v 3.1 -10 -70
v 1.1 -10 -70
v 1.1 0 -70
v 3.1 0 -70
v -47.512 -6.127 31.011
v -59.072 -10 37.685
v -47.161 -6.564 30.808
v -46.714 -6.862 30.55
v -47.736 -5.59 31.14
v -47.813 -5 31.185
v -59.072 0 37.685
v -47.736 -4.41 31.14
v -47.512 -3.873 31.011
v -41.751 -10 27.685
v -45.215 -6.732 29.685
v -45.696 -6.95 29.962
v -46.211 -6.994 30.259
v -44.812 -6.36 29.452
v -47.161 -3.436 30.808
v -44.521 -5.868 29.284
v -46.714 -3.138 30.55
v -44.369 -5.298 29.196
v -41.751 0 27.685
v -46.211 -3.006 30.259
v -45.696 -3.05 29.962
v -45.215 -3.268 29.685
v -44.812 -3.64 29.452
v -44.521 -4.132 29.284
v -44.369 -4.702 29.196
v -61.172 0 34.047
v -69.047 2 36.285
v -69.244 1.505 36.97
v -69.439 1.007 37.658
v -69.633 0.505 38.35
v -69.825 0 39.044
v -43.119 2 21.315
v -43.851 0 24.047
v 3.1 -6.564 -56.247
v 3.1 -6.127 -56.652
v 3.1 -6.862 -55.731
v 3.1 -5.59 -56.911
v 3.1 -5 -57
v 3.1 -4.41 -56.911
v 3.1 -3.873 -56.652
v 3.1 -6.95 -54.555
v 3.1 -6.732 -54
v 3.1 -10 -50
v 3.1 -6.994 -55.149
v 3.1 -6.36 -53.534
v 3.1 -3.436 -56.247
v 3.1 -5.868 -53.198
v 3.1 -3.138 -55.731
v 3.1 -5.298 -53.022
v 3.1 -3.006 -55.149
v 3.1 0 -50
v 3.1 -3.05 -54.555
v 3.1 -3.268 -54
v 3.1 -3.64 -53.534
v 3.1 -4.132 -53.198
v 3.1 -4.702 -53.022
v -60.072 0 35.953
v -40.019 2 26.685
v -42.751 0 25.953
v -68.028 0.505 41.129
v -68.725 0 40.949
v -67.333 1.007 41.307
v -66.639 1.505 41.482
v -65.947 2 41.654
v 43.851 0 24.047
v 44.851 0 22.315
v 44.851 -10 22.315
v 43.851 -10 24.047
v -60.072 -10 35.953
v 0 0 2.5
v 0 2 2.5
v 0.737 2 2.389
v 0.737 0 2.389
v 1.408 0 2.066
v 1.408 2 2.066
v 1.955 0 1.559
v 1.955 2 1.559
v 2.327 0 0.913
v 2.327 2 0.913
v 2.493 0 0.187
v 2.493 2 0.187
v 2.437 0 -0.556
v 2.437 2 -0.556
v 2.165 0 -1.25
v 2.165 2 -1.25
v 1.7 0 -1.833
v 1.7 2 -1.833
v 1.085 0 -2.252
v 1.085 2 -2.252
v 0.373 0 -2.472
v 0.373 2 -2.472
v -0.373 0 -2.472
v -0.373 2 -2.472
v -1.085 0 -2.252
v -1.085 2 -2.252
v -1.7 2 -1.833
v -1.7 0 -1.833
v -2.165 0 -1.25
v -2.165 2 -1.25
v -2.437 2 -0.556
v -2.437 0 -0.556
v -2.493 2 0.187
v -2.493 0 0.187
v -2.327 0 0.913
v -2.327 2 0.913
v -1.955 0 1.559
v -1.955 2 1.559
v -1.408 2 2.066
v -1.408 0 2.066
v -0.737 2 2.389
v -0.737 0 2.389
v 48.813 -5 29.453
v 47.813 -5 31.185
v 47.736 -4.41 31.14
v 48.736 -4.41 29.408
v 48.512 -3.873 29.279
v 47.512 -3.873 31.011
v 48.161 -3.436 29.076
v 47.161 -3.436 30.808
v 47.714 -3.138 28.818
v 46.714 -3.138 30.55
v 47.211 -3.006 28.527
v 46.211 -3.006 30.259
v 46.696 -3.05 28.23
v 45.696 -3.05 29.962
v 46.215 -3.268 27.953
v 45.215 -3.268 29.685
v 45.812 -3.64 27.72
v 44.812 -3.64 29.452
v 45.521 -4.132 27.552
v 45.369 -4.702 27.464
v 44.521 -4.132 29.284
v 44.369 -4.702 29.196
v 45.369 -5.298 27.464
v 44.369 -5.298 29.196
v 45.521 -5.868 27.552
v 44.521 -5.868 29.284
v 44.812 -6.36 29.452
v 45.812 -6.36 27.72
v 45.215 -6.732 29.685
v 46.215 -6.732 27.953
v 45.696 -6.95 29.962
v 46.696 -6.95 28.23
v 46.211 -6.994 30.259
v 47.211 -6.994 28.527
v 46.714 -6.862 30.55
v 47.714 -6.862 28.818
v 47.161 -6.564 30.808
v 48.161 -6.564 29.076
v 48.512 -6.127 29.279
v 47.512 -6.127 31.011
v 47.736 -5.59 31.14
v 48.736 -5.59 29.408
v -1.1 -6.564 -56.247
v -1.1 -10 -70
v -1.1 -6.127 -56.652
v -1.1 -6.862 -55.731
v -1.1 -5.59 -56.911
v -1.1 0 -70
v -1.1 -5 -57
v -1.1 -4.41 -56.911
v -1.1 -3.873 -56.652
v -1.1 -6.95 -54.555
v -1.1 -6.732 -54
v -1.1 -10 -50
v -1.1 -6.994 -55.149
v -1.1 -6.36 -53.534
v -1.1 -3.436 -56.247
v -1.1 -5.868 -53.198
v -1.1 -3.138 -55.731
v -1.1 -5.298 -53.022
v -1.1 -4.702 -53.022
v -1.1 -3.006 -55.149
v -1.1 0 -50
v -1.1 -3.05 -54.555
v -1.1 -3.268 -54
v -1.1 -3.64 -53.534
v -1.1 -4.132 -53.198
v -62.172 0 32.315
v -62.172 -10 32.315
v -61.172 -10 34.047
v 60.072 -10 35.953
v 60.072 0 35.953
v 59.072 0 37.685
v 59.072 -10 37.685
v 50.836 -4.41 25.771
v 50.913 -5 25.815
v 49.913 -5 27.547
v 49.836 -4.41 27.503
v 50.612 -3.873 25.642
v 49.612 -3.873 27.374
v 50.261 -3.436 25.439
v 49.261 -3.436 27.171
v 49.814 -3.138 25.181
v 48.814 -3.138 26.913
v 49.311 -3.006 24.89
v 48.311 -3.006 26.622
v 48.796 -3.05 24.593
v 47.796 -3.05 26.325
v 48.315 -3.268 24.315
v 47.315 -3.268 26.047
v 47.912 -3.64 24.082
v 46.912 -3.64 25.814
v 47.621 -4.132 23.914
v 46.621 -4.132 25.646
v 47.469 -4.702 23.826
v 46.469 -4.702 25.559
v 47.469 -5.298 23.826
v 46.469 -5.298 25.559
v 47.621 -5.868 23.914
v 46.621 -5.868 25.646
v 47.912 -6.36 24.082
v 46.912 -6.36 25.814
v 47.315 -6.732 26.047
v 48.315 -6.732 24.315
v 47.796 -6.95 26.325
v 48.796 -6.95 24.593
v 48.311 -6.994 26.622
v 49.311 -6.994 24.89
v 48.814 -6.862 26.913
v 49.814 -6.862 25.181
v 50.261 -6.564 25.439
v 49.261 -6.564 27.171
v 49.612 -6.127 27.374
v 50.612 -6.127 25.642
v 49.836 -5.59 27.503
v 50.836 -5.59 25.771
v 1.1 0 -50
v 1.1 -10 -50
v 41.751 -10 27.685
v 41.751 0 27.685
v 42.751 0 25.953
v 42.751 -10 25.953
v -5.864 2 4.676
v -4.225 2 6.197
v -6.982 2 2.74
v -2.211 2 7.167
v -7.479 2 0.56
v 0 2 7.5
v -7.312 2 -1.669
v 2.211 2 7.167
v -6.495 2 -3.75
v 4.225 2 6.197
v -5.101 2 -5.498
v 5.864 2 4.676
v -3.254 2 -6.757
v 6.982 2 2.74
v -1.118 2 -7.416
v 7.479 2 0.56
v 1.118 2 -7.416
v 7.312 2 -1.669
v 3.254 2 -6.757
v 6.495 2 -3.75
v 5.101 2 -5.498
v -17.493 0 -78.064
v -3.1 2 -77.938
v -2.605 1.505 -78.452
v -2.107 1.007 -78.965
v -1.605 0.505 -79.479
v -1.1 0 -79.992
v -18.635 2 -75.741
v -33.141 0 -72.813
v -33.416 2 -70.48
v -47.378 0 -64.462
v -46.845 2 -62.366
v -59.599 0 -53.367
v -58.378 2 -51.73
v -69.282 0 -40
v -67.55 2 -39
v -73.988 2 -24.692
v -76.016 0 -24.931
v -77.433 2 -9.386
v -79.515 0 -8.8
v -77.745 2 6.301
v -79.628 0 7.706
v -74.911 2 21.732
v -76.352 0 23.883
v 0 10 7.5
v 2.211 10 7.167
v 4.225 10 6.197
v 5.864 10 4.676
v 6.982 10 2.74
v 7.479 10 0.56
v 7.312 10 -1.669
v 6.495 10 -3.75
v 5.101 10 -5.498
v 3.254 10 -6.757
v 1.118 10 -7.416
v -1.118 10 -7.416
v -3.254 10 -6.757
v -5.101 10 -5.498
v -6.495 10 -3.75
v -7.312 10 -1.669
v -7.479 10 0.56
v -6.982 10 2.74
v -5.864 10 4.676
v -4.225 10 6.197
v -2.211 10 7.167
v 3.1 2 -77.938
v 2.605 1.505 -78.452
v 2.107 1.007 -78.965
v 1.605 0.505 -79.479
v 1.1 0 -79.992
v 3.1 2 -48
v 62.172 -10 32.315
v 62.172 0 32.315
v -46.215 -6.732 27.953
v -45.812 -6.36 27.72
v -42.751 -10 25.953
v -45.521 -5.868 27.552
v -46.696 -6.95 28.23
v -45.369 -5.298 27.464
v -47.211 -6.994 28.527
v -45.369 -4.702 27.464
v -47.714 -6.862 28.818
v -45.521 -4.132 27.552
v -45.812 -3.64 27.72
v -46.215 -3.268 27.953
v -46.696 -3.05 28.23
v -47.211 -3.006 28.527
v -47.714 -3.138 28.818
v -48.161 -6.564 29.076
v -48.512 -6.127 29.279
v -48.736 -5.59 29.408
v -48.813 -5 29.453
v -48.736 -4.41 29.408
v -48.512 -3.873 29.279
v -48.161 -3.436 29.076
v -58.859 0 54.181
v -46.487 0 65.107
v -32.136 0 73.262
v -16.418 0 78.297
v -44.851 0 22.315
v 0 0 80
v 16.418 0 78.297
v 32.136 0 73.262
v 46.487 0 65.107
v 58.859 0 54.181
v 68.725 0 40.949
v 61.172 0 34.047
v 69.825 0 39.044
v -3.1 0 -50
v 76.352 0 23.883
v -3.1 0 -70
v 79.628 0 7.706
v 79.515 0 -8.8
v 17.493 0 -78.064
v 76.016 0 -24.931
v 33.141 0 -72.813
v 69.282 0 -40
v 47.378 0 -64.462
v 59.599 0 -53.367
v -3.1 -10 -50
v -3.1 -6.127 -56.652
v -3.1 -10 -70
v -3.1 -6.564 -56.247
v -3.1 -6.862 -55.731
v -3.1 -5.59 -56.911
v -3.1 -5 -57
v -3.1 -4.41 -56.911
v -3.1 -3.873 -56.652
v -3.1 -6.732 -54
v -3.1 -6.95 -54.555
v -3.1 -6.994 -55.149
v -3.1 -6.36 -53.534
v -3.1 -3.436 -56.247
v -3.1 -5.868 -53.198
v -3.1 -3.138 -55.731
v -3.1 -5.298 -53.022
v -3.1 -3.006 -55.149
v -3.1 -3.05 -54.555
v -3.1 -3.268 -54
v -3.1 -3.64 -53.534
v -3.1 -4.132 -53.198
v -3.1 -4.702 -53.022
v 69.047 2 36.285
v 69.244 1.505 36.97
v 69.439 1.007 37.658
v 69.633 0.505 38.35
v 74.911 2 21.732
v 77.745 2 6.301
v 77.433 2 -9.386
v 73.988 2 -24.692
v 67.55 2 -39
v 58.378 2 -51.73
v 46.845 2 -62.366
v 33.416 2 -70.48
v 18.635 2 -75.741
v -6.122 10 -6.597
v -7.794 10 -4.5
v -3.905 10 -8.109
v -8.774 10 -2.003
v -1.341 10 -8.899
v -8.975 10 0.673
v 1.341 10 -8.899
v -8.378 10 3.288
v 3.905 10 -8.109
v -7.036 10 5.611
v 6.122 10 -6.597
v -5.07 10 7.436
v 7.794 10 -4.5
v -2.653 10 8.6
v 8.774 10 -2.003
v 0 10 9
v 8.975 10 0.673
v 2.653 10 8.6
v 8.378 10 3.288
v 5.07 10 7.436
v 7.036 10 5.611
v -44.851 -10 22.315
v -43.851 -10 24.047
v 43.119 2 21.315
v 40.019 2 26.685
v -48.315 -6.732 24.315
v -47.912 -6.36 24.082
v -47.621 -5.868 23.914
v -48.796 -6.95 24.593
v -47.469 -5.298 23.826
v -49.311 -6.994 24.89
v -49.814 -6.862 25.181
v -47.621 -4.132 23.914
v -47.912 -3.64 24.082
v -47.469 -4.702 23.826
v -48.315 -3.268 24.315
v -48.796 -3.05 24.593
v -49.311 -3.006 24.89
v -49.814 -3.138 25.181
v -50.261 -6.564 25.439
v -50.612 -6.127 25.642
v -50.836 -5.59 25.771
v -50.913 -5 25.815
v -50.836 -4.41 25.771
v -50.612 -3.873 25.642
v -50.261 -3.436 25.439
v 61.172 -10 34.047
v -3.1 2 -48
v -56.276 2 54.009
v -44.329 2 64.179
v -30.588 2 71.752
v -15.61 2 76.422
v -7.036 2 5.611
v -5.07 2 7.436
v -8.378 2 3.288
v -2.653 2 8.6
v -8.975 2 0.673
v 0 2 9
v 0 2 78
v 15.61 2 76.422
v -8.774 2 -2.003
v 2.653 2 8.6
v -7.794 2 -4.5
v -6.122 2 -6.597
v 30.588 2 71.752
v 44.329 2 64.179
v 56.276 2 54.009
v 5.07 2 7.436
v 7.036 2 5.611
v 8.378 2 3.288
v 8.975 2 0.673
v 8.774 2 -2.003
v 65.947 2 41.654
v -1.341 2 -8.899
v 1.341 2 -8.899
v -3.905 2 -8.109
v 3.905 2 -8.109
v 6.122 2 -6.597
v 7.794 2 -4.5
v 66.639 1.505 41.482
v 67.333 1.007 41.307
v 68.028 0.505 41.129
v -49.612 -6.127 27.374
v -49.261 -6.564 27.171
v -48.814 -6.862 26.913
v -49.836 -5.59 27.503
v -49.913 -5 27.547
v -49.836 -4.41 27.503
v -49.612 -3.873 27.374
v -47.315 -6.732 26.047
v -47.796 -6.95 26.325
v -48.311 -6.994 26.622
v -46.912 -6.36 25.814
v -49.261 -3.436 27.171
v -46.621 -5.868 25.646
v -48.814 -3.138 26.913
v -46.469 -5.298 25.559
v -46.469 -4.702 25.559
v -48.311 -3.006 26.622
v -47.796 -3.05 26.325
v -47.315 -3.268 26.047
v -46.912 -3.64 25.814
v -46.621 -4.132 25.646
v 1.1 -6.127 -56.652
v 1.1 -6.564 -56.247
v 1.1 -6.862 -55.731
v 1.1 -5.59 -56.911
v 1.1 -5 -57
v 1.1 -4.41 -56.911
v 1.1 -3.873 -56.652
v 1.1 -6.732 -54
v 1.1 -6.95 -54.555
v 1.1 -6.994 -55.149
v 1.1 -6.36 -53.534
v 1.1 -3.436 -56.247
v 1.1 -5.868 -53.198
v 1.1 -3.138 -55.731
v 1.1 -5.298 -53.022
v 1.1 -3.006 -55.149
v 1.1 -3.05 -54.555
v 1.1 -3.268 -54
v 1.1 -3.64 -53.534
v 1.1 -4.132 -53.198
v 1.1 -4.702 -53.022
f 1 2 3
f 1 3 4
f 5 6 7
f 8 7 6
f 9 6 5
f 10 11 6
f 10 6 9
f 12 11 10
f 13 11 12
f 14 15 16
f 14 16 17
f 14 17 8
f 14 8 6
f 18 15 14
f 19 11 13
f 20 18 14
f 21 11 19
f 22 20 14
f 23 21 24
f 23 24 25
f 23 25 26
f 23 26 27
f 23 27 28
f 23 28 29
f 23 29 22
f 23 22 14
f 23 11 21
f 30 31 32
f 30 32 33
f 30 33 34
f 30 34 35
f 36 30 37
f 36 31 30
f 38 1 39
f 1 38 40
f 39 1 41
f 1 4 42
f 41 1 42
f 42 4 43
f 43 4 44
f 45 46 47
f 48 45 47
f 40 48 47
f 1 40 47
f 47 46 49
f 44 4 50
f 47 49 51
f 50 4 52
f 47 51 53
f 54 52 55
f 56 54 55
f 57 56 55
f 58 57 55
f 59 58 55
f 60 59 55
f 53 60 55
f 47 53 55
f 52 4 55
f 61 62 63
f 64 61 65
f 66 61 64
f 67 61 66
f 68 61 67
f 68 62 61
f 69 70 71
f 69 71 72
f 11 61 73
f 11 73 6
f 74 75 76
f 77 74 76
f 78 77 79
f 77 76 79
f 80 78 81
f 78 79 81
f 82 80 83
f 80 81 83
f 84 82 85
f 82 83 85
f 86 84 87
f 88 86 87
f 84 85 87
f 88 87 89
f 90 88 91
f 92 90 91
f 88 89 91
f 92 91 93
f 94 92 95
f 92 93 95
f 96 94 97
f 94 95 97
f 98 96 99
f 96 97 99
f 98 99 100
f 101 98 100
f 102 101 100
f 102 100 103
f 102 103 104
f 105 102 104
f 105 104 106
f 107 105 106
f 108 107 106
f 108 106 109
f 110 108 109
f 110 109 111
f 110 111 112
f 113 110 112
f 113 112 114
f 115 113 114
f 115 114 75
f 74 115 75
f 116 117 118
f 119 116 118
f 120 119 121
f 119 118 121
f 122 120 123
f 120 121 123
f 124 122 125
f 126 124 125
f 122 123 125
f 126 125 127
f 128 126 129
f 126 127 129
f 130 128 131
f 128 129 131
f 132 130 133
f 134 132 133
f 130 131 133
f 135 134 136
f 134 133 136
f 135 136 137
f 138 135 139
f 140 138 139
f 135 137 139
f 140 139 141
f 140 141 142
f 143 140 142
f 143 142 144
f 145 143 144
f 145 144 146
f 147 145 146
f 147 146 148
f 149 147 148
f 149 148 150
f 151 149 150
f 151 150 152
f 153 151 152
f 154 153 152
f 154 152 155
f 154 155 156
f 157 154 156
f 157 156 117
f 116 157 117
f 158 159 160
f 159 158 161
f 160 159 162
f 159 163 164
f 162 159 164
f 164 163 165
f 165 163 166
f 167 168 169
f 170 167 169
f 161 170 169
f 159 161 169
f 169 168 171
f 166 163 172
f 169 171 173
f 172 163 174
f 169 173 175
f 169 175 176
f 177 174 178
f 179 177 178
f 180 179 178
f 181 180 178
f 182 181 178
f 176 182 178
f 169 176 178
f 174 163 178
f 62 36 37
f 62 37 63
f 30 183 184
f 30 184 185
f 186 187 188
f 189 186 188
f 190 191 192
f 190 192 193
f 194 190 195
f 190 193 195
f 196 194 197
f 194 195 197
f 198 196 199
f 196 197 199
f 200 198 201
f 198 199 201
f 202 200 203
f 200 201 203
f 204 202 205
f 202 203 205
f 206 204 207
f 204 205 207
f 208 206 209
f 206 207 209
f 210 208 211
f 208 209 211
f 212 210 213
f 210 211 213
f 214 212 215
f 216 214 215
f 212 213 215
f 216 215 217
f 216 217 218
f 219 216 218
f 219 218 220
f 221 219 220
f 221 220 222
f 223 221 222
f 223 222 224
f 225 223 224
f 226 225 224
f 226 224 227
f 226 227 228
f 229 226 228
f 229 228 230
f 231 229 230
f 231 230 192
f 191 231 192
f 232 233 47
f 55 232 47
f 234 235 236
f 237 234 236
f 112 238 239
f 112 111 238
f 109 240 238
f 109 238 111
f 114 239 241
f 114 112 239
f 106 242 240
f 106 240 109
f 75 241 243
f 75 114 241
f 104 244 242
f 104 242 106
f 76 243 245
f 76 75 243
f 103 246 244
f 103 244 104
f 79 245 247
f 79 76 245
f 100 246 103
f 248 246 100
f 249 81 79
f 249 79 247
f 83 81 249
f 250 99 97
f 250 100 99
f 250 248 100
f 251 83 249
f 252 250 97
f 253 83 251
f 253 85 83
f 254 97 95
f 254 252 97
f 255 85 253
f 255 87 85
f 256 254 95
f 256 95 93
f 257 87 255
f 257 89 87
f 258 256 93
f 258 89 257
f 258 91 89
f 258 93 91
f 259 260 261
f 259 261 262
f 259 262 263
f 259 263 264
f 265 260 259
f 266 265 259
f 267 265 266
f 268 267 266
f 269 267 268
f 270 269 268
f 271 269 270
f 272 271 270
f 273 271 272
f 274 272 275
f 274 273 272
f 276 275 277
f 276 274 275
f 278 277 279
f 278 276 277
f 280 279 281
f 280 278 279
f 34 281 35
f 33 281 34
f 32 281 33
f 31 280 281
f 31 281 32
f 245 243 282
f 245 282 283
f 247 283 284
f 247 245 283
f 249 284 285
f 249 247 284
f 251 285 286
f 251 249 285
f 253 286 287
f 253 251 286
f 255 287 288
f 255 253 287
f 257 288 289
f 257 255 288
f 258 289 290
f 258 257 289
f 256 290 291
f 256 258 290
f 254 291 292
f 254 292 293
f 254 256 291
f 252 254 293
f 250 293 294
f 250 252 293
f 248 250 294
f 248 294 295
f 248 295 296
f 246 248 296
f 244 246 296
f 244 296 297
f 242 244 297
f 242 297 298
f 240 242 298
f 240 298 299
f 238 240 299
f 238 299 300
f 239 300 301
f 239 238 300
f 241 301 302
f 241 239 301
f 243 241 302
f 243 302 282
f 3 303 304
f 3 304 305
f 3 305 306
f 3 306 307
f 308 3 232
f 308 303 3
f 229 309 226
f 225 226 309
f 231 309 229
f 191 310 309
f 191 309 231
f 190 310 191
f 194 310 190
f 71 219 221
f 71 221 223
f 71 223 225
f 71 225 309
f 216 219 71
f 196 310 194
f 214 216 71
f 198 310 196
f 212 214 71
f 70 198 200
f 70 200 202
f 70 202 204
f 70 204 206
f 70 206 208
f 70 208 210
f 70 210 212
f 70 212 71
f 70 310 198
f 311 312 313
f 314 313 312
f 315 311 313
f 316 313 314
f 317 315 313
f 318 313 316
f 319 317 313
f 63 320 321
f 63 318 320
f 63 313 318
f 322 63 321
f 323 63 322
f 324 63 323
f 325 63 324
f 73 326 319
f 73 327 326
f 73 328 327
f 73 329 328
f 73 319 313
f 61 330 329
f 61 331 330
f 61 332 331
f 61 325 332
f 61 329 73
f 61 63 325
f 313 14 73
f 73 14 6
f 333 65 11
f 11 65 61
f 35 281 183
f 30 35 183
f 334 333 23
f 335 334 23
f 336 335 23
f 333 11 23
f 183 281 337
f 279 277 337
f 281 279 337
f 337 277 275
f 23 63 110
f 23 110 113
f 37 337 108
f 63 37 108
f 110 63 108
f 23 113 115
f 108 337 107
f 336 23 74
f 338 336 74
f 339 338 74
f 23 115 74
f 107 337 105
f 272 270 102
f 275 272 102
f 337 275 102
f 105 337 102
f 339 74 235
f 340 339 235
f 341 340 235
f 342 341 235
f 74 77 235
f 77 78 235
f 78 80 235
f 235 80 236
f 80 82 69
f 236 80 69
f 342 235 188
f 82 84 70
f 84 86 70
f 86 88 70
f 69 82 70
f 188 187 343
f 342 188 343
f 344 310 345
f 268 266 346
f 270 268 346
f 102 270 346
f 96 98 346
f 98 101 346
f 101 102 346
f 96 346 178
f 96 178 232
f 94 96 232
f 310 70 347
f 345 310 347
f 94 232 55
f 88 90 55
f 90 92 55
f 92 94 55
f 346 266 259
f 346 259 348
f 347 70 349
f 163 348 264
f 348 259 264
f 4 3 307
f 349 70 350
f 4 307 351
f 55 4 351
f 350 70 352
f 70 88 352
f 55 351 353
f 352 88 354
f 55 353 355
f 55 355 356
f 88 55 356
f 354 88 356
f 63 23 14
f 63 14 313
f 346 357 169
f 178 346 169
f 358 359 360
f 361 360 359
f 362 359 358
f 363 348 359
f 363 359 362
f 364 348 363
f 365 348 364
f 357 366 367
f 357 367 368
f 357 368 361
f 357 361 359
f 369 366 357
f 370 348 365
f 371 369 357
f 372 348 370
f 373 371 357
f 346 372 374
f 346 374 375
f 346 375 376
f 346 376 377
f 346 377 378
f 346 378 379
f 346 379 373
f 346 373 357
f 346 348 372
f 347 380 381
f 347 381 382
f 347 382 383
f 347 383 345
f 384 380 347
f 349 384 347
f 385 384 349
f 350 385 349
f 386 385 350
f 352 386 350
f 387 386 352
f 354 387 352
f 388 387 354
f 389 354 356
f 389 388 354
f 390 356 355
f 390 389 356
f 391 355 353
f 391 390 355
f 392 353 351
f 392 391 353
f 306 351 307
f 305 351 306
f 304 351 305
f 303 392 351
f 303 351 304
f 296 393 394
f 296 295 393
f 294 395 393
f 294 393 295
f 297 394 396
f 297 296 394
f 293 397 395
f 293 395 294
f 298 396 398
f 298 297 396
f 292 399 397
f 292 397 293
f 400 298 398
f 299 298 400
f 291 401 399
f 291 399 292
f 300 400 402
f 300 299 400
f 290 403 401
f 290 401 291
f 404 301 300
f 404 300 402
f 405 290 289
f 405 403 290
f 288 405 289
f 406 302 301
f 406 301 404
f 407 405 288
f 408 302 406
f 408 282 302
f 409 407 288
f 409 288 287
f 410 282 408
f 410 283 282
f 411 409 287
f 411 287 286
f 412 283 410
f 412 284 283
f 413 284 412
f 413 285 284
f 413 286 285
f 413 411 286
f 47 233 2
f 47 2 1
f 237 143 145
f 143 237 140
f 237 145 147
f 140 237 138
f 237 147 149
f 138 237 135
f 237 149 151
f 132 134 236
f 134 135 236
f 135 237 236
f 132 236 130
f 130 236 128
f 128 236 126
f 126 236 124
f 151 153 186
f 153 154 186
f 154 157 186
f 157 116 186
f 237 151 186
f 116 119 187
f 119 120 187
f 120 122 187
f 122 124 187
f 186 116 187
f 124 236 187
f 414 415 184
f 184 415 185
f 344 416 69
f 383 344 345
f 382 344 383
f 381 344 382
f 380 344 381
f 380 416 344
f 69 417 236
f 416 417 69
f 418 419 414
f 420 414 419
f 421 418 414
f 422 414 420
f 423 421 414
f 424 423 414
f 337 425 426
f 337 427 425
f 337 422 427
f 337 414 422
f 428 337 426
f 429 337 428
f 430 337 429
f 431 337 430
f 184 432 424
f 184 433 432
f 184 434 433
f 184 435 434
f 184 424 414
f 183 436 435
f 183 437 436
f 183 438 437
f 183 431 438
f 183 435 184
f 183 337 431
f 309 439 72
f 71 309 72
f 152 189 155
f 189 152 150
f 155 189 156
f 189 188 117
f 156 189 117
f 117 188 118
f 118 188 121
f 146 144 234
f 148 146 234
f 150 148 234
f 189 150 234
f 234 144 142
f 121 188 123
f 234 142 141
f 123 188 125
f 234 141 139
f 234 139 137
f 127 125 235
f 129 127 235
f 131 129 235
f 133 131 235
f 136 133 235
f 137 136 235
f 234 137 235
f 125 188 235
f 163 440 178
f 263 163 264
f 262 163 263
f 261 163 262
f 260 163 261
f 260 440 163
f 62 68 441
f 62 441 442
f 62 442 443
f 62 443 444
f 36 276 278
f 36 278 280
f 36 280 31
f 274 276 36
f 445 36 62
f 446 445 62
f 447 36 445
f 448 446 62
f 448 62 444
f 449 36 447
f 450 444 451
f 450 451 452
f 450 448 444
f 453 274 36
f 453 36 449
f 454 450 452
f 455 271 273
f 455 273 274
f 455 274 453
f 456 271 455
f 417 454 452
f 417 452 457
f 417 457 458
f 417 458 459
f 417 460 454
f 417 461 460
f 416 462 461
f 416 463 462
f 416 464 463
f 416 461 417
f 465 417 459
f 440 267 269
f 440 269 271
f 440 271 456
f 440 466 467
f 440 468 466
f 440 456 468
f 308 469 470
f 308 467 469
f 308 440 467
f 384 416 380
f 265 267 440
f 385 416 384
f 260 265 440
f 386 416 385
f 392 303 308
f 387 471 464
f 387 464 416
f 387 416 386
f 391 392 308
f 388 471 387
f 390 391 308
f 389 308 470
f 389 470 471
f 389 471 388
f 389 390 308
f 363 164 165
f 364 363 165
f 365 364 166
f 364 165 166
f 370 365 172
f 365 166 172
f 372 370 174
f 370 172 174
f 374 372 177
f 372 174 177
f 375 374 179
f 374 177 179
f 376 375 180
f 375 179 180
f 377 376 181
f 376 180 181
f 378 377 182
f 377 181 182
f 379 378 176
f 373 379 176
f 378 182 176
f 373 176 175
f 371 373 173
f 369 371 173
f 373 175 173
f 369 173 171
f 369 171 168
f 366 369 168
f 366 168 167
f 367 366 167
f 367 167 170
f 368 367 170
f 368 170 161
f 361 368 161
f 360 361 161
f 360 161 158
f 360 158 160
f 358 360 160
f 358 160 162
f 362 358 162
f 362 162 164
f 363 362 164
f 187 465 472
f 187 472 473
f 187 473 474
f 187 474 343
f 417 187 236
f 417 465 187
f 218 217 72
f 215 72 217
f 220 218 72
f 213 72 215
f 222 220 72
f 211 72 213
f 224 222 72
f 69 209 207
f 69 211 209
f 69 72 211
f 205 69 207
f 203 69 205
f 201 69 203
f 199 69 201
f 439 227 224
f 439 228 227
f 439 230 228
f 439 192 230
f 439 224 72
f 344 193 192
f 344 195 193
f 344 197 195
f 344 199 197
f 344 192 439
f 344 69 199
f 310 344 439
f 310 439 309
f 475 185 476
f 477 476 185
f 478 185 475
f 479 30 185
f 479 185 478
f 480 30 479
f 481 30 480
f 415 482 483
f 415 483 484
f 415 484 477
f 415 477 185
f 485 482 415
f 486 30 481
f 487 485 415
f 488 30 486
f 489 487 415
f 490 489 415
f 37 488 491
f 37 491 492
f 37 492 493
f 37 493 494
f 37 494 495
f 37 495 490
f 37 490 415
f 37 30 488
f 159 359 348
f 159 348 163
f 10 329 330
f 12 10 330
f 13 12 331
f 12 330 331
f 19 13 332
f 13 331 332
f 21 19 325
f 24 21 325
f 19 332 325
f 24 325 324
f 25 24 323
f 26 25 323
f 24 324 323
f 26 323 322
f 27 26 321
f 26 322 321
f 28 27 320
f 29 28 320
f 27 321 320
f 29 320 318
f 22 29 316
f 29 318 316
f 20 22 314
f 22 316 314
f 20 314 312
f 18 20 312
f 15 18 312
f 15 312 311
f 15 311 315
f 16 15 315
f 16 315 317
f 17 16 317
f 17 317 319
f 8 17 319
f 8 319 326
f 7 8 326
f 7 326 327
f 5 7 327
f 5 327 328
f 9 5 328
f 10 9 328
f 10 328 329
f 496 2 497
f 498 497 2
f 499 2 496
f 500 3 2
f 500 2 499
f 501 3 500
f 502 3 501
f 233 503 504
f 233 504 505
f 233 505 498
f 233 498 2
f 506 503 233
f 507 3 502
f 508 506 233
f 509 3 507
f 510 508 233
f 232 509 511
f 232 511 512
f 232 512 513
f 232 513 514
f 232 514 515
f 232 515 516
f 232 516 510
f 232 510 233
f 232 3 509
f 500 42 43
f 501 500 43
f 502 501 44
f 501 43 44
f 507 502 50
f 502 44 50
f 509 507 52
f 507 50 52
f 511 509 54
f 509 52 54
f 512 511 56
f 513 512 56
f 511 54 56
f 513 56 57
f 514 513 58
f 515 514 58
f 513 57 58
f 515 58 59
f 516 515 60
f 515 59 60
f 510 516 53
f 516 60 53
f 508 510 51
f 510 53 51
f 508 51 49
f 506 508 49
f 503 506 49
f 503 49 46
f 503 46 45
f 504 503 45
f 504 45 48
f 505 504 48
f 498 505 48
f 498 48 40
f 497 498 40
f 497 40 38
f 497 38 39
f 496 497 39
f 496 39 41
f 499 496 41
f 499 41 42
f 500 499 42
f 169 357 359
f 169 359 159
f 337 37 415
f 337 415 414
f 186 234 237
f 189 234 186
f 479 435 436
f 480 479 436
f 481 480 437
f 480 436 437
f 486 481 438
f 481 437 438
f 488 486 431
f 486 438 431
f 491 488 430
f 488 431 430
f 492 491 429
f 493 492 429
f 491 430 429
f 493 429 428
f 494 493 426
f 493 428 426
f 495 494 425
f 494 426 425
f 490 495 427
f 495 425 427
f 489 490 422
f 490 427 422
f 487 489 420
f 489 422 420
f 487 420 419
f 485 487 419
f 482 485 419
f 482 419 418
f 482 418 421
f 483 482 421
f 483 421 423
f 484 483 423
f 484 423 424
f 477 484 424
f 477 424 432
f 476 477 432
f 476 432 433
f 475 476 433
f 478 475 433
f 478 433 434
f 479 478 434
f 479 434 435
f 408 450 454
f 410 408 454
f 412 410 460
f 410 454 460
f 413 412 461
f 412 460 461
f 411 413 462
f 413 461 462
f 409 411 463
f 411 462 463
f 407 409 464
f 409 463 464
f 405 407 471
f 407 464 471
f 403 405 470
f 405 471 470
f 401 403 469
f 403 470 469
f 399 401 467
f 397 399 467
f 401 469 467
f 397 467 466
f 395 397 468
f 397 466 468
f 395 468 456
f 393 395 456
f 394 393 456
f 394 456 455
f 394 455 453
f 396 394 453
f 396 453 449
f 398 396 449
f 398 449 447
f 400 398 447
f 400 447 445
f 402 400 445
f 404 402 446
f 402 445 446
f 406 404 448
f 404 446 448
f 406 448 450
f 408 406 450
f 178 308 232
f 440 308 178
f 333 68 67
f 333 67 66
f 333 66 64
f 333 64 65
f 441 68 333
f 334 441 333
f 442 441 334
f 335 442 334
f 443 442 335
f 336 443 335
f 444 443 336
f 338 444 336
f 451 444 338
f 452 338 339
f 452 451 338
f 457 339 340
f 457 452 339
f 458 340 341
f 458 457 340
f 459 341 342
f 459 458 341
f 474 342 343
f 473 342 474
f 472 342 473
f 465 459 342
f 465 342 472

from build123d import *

# Parameters (mm, degrees)
BOSS_EXTRUDE1_DEPTH = 2
BOSS_EXTRUDE1_DRAFT = 45
SKETCH2_R           = 2.5
CUT_EXTRUDE1_DEPTH  = 114.154761278
SKETCH3_R           = 9
SKETCH3_R_2         = 7.5
BOSS_EXTRUDE2_DEPTH = 8
SKETCH4_W           = 2
SKETCH4_H           = 20
BOSS_EXTRUDE3_DEPTH = 10
SKETCH5_R           = 2
CUT_EXTRUDE2_DEPTH  = 10
CIRPATTERN1_COUNT   = 3


# Read off the part's stored shape, not the designer's step: Boss-Extrude1
with BuildPart() as part:
    # Boss-Extrude1 outline → Boss-Extrude1 (with draft: the straight prism first)
    with BuildSketch(Plane(origin=(0, 2, 0), x_dir=(1, 0, 0), z_dir=(0, 1, 0))):
        with BuildLine():
            ThreePointArc((-3.1, 77.938373091), (-67.549981495, 39), (-69.046611026, -36.284507794))
            Line((-69.046611026, -36.284507794), (-43.119219382, -21.315321248))
            Line((-43.119219382, -21.315321248), (-40.019219382, -26.684678752))
            Line((-40.019219382, -26.684678752), (-65.946611026, -41.653865297))
            ThreePointArc((-65.946611026, -41.653865297), (0, -78), (65.946611026, -41.653865297))
            Line((65.946611026, -41.653865297), (40.019219382, -26.684678752))
            Line((40.019219382, -26.684678752), (43.119219382, -21.315321248))
            Line((43.119219382, -21.315321248), (69.046611026, -36.284507794))
            ThreePointArc((69.046611026, -36.284507794), (67.549981495, 39), (3.1, 77.938373091))
            Line((3.1, 77.938373091), (3.1, 48))
            Line((3.1, 48), (-3.1, 48))
            Line((-3.1, 48), (-3.1, 77.938373091))
        make_face()
    extrude(amount=-BOSS_EXTRUDE1_DEPTH)
    # Boss-Extrude1: the draft: its side faces are tilted about the plane it starts from
    boss_extrude1_sides = [part.faces().sort_by_distance(p)[0] for p in [
        (67.549981495, 1, -39),
        (3.1, 1, -62.969186546),
        (0, 1, -48),
        (-3.1, 1, -62.969186546),
        (-67.549981495, 1, -39),
        (-56.082915204, 1, 28.799914521),
        (-41.569219382, 1, 24),
        (-52.982915204, 1, 34.169272025),
        (0, 1, 78),
        (52.982915204, 1, 34.169272025),
        (41.569219382, 1, 24),
        (56.082915204, 1, 28.799914521),
    ]]
    draft(boss_extrude1_sides, Plane(origin=(0, 2, 0), x_dir=(1, 0, 0), z_dir=(0, 1, 0)), BOSS_EXTRUDE1_DRAFT)

    # Sketch2 → Cut-Extrude1 (cut, through all)
    with BuildSketch(Plane(origin=(0, 2, 0), x_dir=(1, 0, 0), z_dir=(0, 1, 0))):
        with Locations(Location((0, 0, 0), (0, 0, 270))):
            Circle(SKETCH2_R)
    extrude(amount=-CUT_EXTRUDE1_DEPTH, mode=Mode.SUBTRACT)

    # Sketch3 → Boss-Extrude2 (add)
    with BuildSketch(Plane(origin=(0, 2, 0), x_dir=(1, 0, 0), z_dir=(0, 1, 0))):
        with Locations(Location((0, 0, 0), (0, 0, 270))):
            Circle(SKETCH3_R)
        with Locations(Location((0, 0, 0), (0, 0, 270))):
            Circle(SKETCH3_R_2, mode=Mode.SUBTRACT)
    extrude(amount=BOSS_EXTRUDE2_DEPTH)

    # Sketch4 → Boss-Extrude3 (add)
    with BuildSketch(Plane.XZ):
        Polygon((42.751270189, 25.952627944), (60.071778265, 35.952627944), (59.071778265, 37.684678752), (41.751270189, 27.684678752), align=None)
        Polygon((43.851270189, 24.047372056), (61.171778265, 34.047372056), (62.171778265, 32.315321248), (44.851270189, 22.315321248), align=None)
        with Locations((2.1, -60)):
            Rectangle(SKETCH4_W, SKETCH4_H)
        with Locations((-2.1, -60)):
            Rectangle(SKETCH4_W, SKETCH4_H)
        Polygon((-44.851270189, 22.315321248), (-62.171778265, 32.315321248), (-61.171778265, 34.047372056), (-43.851270189, 24.047372056), align=None)
        Polygon((-42.751270189, 25.952627944), (-60.071778265, 35.952627944), (-59.071778265, 37.684678752), (-41.751270189, 27.684678752), align=None)
    extrude(amount=BOSS_EXTRUDE3_DEPTH)

    # Sketch5 → Cut-Extrude2 (cut)
    with BuildSketch(Plane(origin=(3.1, 0, 0), x_dir=(0, 0, -1), z_dir=(1, 0, 0))):
        with Locations((55, -5)):
            Circle(SKETCH5_R)
    cut_extrude2 = extrude(amount=-CUT_EXTRUDE2_DEPTH, mode=Mode.SUBTRACT)

    # CirPattern1: Cut-Extrude2 ×3 about axis
    cirpattern1_axis = Axis((0, 10, 0), (0, -1, 0))
    for i in range(1, CIRPATTERN1_COUNT):
        add(cut_extrude2.rotate(cirpattern1_axis, i * 360 / CIRPATTERN1_COUNT), mode=Mode.SUBTRACT)


solid = part.part
